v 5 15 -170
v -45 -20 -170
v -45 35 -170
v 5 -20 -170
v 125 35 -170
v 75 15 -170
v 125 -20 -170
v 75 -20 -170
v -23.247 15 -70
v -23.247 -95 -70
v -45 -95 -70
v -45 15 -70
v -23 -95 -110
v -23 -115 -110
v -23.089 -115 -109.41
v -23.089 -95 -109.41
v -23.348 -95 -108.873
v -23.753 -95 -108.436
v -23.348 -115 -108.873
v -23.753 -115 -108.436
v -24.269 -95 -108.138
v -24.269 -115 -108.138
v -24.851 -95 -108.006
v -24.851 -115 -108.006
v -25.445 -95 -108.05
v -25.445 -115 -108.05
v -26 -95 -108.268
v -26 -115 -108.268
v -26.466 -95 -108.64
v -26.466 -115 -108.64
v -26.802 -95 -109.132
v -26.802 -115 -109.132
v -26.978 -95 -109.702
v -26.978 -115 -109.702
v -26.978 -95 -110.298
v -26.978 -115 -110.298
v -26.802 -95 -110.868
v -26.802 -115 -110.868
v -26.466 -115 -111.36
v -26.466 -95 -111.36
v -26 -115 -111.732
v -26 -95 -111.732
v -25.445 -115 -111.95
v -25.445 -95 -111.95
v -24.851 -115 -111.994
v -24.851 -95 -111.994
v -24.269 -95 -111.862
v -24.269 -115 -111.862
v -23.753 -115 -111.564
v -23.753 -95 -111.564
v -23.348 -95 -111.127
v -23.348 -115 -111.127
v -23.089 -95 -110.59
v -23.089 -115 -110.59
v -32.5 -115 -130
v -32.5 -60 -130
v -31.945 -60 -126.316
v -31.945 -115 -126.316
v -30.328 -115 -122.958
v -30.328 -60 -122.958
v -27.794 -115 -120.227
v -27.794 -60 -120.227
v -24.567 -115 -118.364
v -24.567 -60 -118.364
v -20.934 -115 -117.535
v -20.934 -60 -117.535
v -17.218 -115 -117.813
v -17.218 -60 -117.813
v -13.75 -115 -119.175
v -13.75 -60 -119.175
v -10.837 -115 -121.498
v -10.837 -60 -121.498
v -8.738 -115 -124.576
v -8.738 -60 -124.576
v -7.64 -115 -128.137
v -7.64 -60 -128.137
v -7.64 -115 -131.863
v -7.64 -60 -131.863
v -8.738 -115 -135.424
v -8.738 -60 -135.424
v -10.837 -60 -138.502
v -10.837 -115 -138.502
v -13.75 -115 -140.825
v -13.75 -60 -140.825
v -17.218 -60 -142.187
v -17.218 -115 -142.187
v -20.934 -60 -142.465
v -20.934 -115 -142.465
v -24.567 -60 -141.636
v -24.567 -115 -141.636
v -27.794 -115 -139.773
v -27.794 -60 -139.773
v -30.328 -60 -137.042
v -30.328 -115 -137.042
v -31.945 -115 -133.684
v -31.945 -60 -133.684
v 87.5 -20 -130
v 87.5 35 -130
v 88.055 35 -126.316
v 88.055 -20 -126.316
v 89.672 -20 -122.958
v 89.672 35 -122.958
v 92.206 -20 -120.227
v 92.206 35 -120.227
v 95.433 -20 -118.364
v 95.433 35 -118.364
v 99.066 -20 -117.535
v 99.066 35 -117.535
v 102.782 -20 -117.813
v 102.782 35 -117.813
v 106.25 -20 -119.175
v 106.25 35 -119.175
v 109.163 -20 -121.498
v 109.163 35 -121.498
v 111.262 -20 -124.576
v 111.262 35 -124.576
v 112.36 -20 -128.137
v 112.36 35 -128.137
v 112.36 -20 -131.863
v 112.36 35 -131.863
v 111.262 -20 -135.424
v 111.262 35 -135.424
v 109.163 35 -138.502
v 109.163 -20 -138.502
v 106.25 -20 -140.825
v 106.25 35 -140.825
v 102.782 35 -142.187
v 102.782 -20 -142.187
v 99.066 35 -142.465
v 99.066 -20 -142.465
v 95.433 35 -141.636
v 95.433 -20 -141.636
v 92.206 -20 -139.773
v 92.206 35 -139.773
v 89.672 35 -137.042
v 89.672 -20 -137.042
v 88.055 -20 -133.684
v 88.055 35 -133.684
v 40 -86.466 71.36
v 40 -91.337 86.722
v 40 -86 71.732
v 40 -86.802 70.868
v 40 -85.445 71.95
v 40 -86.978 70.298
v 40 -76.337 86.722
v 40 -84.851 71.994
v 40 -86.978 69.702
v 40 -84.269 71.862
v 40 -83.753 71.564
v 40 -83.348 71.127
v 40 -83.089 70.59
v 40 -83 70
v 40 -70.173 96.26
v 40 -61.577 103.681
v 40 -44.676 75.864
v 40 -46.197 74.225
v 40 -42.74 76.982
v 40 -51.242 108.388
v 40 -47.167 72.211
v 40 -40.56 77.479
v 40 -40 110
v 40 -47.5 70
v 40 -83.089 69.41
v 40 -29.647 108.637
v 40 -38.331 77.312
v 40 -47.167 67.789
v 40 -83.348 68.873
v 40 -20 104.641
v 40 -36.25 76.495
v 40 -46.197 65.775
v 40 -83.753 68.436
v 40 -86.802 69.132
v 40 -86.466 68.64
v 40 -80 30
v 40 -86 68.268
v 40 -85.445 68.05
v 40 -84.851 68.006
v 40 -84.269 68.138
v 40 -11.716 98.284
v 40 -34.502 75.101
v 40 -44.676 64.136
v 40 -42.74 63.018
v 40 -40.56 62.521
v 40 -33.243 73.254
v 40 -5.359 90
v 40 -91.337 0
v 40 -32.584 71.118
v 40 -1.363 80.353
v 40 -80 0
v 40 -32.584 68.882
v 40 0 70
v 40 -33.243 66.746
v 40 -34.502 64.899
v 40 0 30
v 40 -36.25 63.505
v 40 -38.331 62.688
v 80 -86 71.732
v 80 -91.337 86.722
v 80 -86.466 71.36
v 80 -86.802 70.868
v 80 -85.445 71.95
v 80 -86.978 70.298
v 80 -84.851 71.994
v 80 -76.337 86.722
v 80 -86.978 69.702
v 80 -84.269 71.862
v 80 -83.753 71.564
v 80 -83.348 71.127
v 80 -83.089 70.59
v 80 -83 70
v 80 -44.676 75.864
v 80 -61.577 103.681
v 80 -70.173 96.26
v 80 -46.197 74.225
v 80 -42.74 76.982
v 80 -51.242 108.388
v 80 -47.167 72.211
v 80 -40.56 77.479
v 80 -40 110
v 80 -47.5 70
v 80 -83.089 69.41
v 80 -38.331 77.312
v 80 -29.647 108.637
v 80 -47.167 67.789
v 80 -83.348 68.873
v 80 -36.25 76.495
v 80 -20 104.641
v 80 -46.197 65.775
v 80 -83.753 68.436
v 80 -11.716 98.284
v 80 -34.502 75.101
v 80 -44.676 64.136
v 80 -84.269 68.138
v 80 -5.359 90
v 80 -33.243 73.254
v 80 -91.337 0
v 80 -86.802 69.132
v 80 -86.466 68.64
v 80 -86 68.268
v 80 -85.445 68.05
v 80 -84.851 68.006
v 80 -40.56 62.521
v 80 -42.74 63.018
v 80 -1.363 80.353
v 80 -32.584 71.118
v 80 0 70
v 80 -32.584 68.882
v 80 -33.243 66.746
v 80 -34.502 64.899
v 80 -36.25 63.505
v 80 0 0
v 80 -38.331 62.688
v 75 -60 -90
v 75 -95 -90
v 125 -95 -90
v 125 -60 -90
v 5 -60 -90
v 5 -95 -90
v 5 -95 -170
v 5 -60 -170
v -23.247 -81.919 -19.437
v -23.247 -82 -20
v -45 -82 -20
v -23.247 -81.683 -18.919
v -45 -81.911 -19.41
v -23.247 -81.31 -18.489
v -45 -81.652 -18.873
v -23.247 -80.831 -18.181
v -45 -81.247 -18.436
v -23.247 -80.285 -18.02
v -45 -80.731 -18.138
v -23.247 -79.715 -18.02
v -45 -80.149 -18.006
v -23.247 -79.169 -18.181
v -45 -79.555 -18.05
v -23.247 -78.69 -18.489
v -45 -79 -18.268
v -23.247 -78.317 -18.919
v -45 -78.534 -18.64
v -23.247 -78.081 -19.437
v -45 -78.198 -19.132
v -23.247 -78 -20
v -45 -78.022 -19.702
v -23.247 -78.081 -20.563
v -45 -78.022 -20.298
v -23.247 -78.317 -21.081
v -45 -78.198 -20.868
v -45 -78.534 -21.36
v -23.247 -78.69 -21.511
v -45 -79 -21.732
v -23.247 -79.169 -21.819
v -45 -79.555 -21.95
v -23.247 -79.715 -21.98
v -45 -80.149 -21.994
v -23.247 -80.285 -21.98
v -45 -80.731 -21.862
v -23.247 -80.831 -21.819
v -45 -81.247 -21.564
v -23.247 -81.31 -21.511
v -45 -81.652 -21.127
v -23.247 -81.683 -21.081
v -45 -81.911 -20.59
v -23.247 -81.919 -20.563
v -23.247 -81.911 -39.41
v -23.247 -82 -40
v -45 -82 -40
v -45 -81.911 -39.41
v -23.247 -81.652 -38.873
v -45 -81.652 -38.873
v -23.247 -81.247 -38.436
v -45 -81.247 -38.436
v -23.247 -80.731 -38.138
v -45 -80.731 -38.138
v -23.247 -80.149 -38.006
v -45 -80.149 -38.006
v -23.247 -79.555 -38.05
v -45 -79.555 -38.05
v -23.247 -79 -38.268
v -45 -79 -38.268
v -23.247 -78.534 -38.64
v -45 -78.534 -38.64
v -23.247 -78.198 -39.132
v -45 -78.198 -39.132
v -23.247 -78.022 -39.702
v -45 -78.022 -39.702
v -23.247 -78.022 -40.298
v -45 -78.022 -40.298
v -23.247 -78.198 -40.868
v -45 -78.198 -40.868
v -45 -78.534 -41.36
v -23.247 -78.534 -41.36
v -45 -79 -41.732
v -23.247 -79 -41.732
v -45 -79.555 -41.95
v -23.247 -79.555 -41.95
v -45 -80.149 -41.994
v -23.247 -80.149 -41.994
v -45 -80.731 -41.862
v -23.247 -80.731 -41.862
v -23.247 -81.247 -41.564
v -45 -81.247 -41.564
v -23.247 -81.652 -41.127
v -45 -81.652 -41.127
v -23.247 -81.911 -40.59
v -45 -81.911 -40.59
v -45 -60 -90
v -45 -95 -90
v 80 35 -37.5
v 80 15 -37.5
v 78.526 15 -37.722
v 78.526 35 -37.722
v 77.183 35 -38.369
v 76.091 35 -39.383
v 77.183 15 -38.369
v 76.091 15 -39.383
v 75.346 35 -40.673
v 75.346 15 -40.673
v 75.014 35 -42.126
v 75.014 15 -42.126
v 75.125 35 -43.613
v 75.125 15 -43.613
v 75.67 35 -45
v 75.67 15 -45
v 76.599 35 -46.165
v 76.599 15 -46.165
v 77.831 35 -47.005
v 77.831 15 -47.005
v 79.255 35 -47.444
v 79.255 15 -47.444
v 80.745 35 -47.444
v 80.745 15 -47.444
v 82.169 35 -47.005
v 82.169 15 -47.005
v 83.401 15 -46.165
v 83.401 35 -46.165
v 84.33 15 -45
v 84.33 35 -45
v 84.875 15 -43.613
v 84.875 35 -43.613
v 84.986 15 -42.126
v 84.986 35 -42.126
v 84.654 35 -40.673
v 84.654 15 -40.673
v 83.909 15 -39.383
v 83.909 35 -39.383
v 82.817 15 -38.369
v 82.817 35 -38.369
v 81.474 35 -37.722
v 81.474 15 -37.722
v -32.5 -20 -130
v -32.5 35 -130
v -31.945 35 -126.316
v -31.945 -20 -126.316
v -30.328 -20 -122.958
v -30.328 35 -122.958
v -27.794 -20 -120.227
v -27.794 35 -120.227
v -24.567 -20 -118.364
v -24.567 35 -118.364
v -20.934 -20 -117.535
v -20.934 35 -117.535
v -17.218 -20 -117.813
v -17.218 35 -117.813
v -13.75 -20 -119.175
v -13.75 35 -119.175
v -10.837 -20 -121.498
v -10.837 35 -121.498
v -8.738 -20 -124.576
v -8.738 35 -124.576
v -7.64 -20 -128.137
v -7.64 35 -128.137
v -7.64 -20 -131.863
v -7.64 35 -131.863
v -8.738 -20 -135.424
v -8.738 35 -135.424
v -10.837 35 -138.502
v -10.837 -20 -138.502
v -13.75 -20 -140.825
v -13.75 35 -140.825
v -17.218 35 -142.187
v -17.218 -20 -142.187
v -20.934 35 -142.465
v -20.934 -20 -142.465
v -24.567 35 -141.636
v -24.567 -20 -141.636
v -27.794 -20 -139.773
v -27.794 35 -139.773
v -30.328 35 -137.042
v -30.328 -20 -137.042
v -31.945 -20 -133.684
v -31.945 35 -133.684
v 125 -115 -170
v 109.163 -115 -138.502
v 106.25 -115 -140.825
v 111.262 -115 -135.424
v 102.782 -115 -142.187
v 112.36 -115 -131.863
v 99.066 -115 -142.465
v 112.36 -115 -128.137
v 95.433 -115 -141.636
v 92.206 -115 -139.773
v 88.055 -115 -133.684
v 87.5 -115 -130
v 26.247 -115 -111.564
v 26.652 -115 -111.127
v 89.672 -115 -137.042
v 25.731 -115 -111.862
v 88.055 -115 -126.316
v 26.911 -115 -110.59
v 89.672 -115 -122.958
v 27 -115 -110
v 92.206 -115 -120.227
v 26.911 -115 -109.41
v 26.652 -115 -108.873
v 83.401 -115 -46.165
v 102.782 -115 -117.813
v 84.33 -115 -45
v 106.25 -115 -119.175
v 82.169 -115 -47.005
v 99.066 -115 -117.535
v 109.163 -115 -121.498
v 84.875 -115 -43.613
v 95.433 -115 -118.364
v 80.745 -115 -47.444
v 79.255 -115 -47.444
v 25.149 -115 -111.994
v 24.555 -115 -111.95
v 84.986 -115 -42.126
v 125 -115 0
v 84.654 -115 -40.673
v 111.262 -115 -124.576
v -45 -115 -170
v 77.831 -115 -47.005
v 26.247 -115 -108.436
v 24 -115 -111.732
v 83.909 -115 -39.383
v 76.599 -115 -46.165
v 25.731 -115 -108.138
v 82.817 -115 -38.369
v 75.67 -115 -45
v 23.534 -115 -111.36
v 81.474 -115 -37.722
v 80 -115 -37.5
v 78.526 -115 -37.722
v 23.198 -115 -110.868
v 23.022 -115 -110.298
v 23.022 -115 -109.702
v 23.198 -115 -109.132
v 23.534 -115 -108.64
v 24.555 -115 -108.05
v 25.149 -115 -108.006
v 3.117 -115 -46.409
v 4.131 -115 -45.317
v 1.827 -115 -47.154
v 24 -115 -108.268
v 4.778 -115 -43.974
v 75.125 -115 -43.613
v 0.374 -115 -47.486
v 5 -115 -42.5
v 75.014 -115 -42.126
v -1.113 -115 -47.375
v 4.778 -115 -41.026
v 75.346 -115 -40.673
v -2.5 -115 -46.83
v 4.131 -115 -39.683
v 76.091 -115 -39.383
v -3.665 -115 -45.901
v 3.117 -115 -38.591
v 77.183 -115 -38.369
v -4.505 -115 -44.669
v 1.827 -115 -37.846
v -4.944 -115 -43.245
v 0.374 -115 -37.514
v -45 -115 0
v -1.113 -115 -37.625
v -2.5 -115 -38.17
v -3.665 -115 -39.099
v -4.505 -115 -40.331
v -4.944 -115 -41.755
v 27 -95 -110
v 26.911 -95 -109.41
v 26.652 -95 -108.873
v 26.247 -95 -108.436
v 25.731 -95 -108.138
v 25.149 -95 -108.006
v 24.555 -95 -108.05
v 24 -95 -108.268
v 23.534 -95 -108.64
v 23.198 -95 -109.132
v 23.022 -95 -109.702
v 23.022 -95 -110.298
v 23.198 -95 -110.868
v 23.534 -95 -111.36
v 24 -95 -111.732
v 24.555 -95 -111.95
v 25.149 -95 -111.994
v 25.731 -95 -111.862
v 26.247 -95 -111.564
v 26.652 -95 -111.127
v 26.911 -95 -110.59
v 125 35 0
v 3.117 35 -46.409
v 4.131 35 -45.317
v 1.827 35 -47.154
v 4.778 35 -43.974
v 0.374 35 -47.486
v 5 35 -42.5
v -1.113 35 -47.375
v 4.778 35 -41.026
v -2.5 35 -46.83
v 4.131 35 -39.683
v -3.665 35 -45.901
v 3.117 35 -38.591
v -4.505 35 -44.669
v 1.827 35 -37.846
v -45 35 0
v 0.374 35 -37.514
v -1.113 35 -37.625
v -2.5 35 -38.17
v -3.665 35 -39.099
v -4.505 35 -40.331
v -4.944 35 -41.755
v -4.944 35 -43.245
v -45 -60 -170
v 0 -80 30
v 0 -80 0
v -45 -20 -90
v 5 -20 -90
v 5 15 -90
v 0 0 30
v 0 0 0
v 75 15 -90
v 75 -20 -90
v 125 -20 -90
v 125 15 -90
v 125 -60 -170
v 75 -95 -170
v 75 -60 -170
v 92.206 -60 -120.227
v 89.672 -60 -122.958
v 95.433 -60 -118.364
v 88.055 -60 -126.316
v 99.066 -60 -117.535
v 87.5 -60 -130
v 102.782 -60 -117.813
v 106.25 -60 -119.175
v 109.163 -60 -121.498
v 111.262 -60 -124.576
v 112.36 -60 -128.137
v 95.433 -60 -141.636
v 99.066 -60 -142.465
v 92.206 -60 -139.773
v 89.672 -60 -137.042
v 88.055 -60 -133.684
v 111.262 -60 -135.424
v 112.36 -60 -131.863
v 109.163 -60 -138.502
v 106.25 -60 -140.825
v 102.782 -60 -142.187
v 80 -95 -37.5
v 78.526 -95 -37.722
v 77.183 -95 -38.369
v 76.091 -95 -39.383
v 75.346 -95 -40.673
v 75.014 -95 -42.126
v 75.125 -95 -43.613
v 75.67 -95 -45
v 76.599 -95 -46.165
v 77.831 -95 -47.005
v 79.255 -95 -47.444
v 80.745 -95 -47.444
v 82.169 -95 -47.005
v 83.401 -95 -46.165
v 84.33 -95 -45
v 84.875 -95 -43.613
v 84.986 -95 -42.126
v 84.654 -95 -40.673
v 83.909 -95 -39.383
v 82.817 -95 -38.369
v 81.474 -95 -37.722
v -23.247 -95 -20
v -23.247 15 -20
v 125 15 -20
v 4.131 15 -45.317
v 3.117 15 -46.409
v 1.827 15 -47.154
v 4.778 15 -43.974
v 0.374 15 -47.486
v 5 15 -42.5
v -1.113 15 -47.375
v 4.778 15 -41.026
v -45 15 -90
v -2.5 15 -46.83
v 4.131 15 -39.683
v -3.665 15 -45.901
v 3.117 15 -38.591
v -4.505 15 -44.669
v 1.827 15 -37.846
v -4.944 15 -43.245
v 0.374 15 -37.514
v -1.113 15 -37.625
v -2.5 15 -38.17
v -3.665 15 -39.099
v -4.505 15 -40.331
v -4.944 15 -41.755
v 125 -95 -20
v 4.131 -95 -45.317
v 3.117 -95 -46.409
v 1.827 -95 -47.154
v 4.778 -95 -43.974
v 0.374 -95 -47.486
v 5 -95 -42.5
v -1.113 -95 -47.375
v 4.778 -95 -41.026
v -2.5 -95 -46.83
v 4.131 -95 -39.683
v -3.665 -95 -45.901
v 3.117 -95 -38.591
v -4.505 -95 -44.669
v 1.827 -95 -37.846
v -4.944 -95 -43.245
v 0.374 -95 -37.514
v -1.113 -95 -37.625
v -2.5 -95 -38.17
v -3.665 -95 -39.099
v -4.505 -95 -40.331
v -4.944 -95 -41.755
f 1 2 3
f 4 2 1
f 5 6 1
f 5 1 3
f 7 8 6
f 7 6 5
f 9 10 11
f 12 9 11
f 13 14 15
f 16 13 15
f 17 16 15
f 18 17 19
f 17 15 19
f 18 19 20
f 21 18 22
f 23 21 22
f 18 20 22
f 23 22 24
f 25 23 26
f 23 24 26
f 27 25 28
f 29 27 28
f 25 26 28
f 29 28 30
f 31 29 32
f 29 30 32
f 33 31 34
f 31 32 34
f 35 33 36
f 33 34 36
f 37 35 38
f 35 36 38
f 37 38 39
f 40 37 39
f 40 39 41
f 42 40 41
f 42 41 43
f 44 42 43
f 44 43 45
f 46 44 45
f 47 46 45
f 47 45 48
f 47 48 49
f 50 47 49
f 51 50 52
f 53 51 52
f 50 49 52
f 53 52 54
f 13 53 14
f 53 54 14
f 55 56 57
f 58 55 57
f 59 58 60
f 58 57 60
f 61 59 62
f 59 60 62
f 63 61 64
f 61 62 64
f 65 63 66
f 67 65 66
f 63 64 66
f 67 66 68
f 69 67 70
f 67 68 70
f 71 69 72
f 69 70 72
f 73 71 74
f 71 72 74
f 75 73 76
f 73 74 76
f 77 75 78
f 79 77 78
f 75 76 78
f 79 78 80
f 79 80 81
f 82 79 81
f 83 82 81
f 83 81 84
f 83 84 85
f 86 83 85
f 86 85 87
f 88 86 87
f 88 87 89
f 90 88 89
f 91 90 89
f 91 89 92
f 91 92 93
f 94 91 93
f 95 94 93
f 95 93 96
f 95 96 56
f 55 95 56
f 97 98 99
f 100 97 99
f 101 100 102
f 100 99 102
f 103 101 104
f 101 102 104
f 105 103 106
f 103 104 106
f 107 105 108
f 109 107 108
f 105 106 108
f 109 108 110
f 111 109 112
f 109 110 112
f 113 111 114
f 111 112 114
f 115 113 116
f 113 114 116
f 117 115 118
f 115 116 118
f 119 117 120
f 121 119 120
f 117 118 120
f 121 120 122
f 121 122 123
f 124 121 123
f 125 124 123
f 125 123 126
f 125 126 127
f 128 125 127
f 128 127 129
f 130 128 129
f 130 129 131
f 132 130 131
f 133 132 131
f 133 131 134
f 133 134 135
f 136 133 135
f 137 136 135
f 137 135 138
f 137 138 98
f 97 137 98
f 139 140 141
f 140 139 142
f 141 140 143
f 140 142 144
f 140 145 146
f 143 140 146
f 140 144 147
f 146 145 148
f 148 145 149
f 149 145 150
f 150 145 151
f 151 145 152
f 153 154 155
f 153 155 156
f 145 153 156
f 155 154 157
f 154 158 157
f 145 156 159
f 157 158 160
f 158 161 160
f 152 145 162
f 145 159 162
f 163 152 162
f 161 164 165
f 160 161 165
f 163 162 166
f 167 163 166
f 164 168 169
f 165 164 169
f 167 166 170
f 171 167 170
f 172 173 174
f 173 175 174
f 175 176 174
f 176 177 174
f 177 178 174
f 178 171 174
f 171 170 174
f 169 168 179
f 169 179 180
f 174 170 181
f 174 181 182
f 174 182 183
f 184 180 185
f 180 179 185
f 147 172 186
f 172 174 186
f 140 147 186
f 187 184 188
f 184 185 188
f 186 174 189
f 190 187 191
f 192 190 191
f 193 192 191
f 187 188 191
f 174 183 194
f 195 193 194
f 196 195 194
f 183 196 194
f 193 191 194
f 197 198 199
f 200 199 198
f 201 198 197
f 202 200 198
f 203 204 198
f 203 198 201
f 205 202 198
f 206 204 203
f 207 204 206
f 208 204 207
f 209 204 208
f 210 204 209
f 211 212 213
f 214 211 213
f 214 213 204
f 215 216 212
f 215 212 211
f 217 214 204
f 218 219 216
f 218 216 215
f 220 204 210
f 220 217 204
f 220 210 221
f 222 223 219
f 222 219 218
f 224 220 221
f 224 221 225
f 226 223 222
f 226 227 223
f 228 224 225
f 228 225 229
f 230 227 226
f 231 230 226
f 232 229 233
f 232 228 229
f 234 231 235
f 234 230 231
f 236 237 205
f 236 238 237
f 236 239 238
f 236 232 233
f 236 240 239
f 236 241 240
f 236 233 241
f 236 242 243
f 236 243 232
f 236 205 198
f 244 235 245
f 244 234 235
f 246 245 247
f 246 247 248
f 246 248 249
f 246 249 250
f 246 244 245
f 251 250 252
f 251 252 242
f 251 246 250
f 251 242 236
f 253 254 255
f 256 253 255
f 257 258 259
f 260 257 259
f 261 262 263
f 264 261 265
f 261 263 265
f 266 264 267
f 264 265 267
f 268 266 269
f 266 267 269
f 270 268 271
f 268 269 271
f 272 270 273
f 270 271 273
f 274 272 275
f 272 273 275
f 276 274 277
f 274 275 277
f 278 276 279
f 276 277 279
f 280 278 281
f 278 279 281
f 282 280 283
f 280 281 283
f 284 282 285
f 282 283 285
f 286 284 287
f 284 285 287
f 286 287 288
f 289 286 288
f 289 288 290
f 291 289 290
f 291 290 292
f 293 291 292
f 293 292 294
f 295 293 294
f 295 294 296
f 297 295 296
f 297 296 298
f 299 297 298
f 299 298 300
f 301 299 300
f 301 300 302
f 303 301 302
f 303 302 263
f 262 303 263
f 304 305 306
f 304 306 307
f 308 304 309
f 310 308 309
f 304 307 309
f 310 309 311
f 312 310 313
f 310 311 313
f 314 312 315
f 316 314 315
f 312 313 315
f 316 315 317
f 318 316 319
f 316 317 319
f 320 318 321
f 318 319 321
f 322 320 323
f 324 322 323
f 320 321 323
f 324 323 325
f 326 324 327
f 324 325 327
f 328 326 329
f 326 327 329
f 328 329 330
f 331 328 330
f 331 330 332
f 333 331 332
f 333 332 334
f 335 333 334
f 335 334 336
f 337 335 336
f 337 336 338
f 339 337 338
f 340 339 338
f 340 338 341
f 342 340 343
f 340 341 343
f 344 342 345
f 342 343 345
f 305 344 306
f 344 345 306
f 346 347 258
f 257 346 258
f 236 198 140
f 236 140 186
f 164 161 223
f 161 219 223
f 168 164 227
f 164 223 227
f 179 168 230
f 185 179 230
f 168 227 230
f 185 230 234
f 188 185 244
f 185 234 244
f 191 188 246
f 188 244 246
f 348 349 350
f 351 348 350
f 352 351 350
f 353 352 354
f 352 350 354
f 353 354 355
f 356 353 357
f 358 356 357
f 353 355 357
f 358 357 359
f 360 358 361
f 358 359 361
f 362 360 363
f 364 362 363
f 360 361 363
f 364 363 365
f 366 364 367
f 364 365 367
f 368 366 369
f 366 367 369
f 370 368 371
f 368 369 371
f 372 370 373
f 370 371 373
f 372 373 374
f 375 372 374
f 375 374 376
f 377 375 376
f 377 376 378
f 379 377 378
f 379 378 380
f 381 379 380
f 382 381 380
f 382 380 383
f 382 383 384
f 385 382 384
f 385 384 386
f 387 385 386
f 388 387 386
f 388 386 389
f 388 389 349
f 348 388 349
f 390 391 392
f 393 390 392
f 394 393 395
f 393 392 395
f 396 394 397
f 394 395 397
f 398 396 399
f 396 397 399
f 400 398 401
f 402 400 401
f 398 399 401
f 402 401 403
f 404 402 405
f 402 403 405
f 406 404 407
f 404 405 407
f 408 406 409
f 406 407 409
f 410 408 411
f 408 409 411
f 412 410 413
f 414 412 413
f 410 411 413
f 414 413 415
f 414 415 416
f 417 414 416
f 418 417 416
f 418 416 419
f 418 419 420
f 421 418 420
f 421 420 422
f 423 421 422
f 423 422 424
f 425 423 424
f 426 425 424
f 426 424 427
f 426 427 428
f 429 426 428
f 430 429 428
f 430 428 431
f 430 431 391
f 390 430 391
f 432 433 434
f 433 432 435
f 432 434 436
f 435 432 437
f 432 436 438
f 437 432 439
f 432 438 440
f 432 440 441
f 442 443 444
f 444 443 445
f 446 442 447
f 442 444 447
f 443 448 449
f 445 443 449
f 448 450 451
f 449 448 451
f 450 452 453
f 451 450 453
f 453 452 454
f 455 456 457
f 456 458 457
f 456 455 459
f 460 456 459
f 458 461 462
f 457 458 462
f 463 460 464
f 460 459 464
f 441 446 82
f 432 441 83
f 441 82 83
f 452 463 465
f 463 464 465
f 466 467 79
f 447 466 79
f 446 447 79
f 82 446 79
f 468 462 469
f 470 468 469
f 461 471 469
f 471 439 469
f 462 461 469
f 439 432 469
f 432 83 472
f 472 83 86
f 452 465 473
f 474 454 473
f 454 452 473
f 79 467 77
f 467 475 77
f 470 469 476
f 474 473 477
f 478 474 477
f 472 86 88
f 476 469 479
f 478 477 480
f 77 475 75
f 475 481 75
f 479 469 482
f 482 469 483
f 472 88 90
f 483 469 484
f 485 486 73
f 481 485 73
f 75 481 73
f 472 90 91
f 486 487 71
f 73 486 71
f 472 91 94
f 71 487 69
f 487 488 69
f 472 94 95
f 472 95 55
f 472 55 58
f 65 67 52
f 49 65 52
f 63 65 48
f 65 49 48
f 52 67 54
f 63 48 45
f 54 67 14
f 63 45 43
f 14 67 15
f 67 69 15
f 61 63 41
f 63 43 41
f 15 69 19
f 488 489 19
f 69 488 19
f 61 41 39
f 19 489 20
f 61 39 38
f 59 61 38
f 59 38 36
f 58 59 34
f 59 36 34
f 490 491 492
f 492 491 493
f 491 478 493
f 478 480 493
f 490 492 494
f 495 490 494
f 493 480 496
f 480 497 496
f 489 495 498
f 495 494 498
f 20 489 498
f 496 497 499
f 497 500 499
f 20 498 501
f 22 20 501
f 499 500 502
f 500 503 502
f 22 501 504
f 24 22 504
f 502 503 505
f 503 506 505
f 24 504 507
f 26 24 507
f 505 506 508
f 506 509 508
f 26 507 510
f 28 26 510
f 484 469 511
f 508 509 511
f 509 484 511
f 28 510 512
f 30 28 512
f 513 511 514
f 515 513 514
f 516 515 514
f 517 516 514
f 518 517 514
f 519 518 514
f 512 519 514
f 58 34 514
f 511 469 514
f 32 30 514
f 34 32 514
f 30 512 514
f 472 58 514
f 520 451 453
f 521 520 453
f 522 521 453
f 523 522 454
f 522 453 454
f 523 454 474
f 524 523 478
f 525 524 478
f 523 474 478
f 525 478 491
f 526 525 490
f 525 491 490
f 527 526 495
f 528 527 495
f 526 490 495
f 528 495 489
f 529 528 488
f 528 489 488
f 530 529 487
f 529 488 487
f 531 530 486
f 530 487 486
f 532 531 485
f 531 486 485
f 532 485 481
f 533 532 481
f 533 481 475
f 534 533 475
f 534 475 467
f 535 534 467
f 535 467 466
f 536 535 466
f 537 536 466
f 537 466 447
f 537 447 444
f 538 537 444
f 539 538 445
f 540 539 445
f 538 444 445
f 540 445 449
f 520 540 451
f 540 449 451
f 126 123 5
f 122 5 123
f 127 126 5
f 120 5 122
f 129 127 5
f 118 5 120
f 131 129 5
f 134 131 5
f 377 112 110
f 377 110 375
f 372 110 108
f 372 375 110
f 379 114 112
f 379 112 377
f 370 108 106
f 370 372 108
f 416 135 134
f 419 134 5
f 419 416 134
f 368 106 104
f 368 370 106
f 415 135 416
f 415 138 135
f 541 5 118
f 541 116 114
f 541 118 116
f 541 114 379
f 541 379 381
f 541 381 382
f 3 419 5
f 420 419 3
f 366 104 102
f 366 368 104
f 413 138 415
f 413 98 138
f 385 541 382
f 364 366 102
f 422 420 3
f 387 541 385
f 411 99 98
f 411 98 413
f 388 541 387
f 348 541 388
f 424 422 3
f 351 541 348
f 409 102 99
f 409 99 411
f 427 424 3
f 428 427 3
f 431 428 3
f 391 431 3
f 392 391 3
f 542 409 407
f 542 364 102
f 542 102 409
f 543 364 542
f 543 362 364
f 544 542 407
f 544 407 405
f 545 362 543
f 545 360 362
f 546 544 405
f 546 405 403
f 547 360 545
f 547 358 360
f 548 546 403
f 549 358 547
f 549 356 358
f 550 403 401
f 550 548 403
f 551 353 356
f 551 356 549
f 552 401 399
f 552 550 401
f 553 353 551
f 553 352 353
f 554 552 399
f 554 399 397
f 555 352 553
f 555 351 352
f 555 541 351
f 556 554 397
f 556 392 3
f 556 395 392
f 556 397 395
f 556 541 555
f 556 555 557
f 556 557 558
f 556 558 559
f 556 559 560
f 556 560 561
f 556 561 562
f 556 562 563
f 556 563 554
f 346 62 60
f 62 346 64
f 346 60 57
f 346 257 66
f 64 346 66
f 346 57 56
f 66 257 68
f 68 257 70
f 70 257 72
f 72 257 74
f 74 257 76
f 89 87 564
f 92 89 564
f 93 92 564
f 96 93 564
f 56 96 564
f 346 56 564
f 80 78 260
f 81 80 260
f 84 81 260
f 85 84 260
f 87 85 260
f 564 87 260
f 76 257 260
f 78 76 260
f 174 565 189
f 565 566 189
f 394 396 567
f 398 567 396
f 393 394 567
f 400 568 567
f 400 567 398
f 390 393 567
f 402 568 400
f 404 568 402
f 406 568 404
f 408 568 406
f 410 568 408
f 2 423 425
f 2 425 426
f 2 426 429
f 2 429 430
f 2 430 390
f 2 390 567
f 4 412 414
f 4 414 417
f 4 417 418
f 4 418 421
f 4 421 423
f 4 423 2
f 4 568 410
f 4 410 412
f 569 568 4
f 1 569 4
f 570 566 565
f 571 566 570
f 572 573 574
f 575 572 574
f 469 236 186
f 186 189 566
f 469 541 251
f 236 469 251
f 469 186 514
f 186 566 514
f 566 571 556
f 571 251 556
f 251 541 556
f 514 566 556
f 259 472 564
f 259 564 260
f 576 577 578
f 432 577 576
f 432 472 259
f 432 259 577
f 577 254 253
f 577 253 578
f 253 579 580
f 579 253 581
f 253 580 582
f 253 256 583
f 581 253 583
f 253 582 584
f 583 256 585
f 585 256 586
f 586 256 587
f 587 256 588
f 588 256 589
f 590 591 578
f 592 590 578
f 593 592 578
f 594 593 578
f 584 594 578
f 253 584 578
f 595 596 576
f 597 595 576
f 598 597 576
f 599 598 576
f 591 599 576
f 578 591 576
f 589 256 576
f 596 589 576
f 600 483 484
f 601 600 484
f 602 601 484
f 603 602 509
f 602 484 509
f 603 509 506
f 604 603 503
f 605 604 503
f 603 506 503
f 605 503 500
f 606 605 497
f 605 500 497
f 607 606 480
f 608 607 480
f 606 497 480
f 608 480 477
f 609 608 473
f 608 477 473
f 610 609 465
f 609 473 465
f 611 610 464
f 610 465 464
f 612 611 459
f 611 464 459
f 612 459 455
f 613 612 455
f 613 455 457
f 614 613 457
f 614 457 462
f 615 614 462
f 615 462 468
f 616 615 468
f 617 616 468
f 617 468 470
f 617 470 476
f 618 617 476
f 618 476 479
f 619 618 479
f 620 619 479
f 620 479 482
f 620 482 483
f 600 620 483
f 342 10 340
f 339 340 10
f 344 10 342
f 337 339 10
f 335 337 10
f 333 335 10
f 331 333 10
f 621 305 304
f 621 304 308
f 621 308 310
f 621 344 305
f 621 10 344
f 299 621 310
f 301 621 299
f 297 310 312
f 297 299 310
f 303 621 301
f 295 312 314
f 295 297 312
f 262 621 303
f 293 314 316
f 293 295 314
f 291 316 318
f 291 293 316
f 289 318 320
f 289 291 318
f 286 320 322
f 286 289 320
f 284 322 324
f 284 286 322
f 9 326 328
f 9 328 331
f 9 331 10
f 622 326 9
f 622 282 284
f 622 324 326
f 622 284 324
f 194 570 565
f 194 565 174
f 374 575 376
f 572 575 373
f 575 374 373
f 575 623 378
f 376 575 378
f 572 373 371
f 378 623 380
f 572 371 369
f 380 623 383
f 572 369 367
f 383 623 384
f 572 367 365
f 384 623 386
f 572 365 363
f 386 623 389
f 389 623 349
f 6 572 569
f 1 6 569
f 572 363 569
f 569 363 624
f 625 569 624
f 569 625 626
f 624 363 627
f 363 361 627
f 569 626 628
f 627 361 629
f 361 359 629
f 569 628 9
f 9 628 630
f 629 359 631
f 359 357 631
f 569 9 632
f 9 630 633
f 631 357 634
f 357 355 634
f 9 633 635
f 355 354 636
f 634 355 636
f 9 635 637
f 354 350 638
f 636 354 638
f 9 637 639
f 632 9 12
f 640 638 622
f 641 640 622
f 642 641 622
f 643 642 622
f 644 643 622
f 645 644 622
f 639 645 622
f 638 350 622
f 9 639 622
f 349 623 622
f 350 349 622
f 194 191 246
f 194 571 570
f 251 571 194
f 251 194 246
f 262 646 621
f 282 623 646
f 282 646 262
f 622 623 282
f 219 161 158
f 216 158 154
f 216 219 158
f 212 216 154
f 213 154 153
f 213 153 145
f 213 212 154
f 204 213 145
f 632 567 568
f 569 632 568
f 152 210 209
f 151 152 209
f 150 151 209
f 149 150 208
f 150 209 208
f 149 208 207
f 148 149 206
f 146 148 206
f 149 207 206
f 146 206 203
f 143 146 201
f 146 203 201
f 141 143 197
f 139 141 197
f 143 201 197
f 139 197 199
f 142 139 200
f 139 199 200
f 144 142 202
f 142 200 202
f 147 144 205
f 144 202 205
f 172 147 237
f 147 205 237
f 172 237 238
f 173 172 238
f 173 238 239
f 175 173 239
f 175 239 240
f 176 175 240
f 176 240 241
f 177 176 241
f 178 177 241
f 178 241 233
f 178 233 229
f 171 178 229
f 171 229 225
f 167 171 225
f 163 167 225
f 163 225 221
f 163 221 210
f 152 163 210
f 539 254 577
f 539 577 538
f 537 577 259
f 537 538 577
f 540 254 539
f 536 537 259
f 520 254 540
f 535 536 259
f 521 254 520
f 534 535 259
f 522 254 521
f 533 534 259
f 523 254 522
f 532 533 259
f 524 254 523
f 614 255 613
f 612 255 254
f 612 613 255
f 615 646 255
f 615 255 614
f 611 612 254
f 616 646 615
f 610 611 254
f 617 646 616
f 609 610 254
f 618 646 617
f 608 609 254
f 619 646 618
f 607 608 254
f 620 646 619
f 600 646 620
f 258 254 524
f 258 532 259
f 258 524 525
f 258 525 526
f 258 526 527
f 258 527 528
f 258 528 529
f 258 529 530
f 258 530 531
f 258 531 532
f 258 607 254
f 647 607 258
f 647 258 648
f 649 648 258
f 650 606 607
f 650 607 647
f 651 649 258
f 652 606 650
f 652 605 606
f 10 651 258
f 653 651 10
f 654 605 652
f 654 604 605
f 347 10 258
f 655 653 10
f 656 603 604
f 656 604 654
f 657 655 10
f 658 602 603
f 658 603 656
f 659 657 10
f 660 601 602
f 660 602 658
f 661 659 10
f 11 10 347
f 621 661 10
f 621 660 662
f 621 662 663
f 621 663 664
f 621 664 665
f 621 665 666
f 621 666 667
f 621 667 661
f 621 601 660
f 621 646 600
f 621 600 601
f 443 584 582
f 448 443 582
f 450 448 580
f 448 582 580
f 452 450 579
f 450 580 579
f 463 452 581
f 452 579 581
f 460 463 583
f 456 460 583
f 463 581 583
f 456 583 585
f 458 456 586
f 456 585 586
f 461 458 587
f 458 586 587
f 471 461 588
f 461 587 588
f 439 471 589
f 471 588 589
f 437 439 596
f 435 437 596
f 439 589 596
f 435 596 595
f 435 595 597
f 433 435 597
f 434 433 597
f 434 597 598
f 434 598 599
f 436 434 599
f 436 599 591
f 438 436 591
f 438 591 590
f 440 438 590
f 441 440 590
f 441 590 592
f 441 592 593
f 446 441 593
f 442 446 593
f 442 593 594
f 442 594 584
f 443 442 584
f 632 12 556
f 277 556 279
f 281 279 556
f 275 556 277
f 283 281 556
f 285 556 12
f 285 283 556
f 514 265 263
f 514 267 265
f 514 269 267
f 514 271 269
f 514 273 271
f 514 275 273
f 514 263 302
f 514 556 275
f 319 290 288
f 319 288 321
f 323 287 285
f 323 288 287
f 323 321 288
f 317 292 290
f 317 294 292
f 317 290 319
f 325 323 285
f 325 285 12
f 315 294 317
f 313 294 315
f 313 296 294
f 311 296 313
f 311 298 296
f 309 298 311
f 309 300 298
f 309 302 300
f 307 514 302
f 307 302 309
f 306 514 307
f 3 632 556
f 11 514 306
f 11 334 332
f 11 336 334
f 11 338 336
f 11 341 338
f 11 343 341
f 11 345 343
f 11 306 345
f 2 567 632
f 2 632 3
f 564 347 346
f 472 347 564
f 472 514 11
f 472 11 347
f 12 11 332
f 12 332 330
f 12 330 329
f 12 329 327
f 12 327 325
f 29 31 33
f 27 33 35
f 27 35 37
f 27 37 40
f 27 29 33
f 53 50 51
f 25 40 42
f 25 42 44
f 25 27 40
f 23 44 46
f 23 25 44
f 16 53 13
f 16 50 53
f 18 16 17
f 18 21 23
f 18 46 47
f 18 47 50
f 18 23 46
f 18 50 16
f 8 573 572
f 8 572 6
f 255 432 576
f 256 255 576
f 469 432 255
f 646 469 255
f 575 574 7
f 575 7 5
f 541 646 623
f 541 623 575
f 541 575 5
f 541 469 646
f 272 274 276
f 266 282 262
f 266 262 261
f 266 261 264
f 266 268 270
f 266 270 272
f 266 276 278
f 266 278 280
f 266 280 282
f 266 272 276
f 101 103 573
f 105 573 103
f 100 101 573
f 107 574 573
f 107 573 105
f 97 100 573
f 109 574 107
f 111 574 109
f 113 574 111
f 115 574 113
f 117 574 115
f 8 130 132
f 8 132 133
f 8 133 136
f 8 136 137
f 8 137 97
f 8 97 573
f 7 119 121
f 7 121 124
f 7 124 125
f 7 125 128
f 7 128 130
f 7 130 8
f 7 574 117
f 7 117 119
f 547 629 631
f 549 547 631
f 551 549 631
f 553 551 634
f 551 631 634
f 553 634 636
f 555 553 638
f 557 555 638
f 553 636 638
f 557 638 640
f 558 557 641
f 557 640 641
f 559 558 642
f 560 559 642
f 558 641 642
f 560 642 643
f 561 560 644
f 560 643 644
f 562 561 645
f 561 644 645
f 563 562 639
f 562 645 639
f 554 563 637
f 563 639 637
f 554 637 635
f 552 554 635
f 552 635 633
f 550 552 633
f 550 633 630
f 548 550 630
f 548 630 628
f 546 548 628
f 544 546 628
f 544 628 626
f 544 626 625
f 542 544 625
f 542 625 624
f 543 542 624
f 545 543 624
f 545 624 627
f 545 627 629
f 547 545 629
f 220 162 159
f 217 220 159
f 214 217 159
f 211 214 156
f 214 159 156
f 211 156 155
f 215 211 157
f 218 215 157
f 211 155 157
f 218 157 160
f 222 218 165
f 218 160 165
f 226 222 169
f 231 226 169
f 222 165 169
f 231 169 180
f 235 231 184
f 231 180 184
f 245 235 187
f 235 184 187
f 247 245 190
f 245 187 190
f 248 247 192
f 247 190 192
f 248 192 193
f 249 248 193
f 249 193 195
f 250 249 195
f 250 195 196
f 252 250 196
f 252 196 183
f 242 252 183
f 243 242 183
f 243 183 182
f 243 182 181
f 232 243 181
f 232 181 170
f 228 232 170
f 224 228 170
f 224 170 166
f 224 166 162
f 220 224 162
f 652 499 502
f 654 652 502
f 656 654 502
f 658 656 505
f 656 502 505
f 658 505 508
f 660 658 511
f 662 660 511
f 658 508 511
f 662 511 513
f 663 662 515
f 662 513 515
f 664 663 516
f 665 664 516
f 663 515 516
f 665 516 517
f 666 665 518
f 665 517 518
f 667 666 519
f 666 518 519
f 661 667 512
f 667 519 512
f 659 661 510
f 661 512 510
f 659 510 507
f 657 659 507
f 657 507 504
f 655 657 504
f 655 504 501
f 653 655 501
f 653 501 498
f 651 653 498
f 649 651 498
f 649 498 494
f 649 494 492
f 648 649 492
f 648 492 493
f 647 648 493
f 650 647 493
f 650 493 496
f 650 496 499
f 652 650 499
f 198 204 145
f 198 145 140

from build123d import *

# Parameters (mm, degrees)
SKETCH_1_W          = 25
SKETCH_1_H          = 80
SKETCH_1_W_2        = 30
EXTRUDE_1_DEPTH     = 30
SKETCH_2_W          = 40
SKETCH_2_H          = 80
EXTRUDE_2_DEPTH     = 80
FILLET_1_R          = 40
SKETCH_3_R          = 7.5
CUT_EXTRUDE_1_DEPTH = 142.774468788
SKETCH_6_W          = 170
SKETCH_6_H          = 150
EXTRUDE_5_DEPTH     = 20
SKETCH_7_W          = 170
SKETCH_7_H          = 20
EXTRUDE_6_DEPTH     = 150
EXTRUDE_7_DEPTH     = 40
SKETCH_10_R         = 2
CUT_EXTRUDE_3_DEPTH = 241.312296814
SKETCH_11_W         = 50
SKETCH_11_H         = 80
EXTRUDE_8_DEPTH     = 110
SKETCH_12_W         = 80
SKETCH_12_H         = 40
CUT_EXTRUDE_4_DEPTH = 267.505159425
SKETCH_13_R         = 12.5
CUT_EXTRUDE_5_DEPTH = 259.89186932
SKETCH_14_R         = 5
CUT_EXTRUDE_6_DEPTH = 259.89186932
SKETCH_15_W         = 21.752867029
SKETCH_15_H         = 110
EXTRUDE_9_DEPTH     = 50
SKETCH_16_R         = 2
CUT_EXTRUDE_7_DEPTH = 21.752867029
SKETCH_17_R         = 2
CUT_EXTRUDE_8_DEPTH = 20


with BuildPart() as part:
    # 草图1 → 凸台-拉伸1 (new body)
    with BuildSketch(Plane.XY):
        with Locations((12.5, -40)):
            Rectangle(SKETCH_1_W, SKETCH_1_H)
        with Locations((40, -40)):
            Rectangle(SKETCH_1_W_2, SKETCH_1_H)
        with Locations((67.5, -40)):
            Rectangle(SKETCH_1_W, SKETCH_1_H)
    extrude(amount=EXTRUDE_1_DEPTH)

    # 草图2 → 凸台-拉伸2 (add)
    with BuildSketch(Plane.XY.offset(30)):
        with Locations((60, -40)):
            Rectangle(SKETCH_2_W, SKETCH_2_H)
    extrude(amount=EXTRUDE_2_DEPTH)

    # 圆角1
    fillet_1_edges = [part.edges().sort_by_distance(p)[0] for p in [
        (60, 0, 110),
        (60, -80, 110),
    ]]
    fillet(fillet_1_edges, radius=FILLET_1_R - 0.0001)  # a hair under: the kernel refuses the full size

    # 草图3 → 切除-拉伸1 (cut, through all)
    with BuildSketch(Plane.ZY.offset(-40)):
        with Locations(Location((70, -40, 0), (0, 0, 270))):
            Circle(SKETCH_3_R)
    extrude(amount=-CUT_EXTRUDE_1_DEPTH, mode=Mode.SUBTRACT)



with BuildPart() as body_2:
    # 草图6 → 凸台-拉伸5 (new body)
    with BuildSketch(Plane(origin=(0, 0, 0), x_dir=(-1, 0, 0), z_dir=(0, 0, -1))):
        with Locations((-40, -40)):
            Rectangle(SKETCH_6_W, SKETCH_6_H)
    extrude(amount=EXTRUDE_5_DEPTH)

    # 草图7 → 凸台-拉伸6 (add)
    with BuildSketch(Plane(origin=(0, 0, -20), x_dir=(-1, 0, 0), z_dir=(0, 0, -1))):
        with Locations((-40, 25)):
            Rectangle(SKETCH_7_W, SKETCH_7_H)
        with Locations((-40, -105)):
            Rectangle(SKETCH_7_W, SKETCH_7_H)
    extrude(amount=EXTRUDE_6_DEPTH)


with BuildPart() as part_1:
    add(part.part)

    add(body_2.part)  # 凸台-拉伸7 merges body 2
    # 草图9 → 凸台-拉伸7 (add)
    with BuildSketch(Plane(origin=(80, 0, 0), x_dir=(0, 0, -1), z_dir=(1, 0, 0))):
        with BuildLine():
            ThreePointArc((-70, -80), (-78.559038333, -79.073557079), (-86.721603642, -76.337143141))
            Line((-86.721603642, -76.337143141), (-86.721603642, -91.337143141))
            Line((-86.721603642, -91.337143141), (0, -91.337143141))
            Line((0, -91.337143141), (0, -80))
            Line((0, -80), (-70, -80))
        make_face()
    extrude(amount=-EXTRUDE_7_DEPTH)

    # 草图10 → 切除-拉伸3 (cut, through all)
    with BuildSketch(Plane(origin=(80, 0, 0), x_dir=(0, 0, -1), z_dir=(1, 0, 0))):
        with Locations(Location((-70, -85, 0), (0, 0, 90))):
            Circle(SKETCH_10_R)
    extrude(amount=-CUT_EXTRUDE_3_DEPTH, mode=Mode.SUBTRACT)

    # 草图11 → 凸台-拉伸8 (add)
    with BuildSketch(Plane(origin=(0, -95, 0), x_dir=(1, 0, 0), z_dir=(0, 1, 0))):
        with Locations((-20, 130)):
            Rectangle(SKETCH_11_W, SKETCH_11_H)
        with Locations((100, 130)):
            Rectangle(SKETCH_11_W, SKETCH_11_H)
    extrude(amount=EXTRUDE_8_DEPTH)

    # 草图12 → 切除-拉伸4 (cut, through all)
    with BuildSketch(Plane(origin=(125, 0, 0), x_dir=(0, 0, -1), z_dir=(1, 0, 0))):
        with Locations((130, -40)):
            Rectangle(SKETCH_12_W, SKETCH_12_H)
    extrude(amount=-CUT_EXTRUDE_4_DEPTH, mode=Mode.SUBTRACT)

    # 草图13 → 切除-拉伸5 (cut, through all)
    with BuildSketch(Plane(origin=(0, 35, 0), x_dir=(1, 0, 0), z_dir=(0, 1, 0))):
        with Locations(Location((100, 130, 0), (0, 0, 180))):
            Circle(SKETCH_13_R)
        with Locations(Location((-20, 130, 0), (0, 0, 180))):
            Circle(SKETCH_13_R)
    extrude(amount=-CUT_EXTRUDE_5_DEPTH, mode=Mode.SUBTRACT)

    # 草图14 → 切除-拉伸6 (cut, through all)
    with BuildSketch(Plane.XZ.offset(115)):
        with Locations((0, -42.5)):
            Circle(SKETCH_14_R)
        with Locations(Location((80, -42.5, 0), (0, 0, 90))):
            Circle(SKETCH_14_R)
    extrude(amount=-CUT_EXTRUDE_6_DEPTH, mode=Mode.SUBTRACT)

    # 草图15 → 凸台-拉伸9 (add)
    with BuildSketch(Plane(origin=(0, 0, -20), x_dir=(-1, 0, 0), z_dir=(0, 0, -1))):
        with Locations((34.123566485, -40)):
            Rectangle(SKETCH_15_W, SKETCH_15_H)
    extrude(amount=EXTRUDE_9_DEPTH)

    # 草图16 → 切除-拉伸7 (cut)
    with BuildSketch(Plane.ZY.offset(45)):
        with Locations(Location((-20, -80, 0), (0, 0, 270))):
            Circle(SKETCH_16_R)
        with Locations(Location((-40, -80, 0), (0, 0, 270))):
            Circle(SKETCH_16_R)
    extrude(amount=-CUT_EXTRUDE_7_DEPTH, mode=Mode.SUBTRACT)

    # 草图17 → 切除-拉伸8 (cut)
    with BuildSketch(Plane.XZ.offset(115)):
        with Locations((-25, -110)):
            Circle(SKETCH_17_R)
        with Locations((25, -110)):
            Circle(SKETCH_17_R)
    extrude(amount=-CUT_EXTRUDE_8_DEPTH, mode=Mode.SUBTRACT)


solid = part_1.part
